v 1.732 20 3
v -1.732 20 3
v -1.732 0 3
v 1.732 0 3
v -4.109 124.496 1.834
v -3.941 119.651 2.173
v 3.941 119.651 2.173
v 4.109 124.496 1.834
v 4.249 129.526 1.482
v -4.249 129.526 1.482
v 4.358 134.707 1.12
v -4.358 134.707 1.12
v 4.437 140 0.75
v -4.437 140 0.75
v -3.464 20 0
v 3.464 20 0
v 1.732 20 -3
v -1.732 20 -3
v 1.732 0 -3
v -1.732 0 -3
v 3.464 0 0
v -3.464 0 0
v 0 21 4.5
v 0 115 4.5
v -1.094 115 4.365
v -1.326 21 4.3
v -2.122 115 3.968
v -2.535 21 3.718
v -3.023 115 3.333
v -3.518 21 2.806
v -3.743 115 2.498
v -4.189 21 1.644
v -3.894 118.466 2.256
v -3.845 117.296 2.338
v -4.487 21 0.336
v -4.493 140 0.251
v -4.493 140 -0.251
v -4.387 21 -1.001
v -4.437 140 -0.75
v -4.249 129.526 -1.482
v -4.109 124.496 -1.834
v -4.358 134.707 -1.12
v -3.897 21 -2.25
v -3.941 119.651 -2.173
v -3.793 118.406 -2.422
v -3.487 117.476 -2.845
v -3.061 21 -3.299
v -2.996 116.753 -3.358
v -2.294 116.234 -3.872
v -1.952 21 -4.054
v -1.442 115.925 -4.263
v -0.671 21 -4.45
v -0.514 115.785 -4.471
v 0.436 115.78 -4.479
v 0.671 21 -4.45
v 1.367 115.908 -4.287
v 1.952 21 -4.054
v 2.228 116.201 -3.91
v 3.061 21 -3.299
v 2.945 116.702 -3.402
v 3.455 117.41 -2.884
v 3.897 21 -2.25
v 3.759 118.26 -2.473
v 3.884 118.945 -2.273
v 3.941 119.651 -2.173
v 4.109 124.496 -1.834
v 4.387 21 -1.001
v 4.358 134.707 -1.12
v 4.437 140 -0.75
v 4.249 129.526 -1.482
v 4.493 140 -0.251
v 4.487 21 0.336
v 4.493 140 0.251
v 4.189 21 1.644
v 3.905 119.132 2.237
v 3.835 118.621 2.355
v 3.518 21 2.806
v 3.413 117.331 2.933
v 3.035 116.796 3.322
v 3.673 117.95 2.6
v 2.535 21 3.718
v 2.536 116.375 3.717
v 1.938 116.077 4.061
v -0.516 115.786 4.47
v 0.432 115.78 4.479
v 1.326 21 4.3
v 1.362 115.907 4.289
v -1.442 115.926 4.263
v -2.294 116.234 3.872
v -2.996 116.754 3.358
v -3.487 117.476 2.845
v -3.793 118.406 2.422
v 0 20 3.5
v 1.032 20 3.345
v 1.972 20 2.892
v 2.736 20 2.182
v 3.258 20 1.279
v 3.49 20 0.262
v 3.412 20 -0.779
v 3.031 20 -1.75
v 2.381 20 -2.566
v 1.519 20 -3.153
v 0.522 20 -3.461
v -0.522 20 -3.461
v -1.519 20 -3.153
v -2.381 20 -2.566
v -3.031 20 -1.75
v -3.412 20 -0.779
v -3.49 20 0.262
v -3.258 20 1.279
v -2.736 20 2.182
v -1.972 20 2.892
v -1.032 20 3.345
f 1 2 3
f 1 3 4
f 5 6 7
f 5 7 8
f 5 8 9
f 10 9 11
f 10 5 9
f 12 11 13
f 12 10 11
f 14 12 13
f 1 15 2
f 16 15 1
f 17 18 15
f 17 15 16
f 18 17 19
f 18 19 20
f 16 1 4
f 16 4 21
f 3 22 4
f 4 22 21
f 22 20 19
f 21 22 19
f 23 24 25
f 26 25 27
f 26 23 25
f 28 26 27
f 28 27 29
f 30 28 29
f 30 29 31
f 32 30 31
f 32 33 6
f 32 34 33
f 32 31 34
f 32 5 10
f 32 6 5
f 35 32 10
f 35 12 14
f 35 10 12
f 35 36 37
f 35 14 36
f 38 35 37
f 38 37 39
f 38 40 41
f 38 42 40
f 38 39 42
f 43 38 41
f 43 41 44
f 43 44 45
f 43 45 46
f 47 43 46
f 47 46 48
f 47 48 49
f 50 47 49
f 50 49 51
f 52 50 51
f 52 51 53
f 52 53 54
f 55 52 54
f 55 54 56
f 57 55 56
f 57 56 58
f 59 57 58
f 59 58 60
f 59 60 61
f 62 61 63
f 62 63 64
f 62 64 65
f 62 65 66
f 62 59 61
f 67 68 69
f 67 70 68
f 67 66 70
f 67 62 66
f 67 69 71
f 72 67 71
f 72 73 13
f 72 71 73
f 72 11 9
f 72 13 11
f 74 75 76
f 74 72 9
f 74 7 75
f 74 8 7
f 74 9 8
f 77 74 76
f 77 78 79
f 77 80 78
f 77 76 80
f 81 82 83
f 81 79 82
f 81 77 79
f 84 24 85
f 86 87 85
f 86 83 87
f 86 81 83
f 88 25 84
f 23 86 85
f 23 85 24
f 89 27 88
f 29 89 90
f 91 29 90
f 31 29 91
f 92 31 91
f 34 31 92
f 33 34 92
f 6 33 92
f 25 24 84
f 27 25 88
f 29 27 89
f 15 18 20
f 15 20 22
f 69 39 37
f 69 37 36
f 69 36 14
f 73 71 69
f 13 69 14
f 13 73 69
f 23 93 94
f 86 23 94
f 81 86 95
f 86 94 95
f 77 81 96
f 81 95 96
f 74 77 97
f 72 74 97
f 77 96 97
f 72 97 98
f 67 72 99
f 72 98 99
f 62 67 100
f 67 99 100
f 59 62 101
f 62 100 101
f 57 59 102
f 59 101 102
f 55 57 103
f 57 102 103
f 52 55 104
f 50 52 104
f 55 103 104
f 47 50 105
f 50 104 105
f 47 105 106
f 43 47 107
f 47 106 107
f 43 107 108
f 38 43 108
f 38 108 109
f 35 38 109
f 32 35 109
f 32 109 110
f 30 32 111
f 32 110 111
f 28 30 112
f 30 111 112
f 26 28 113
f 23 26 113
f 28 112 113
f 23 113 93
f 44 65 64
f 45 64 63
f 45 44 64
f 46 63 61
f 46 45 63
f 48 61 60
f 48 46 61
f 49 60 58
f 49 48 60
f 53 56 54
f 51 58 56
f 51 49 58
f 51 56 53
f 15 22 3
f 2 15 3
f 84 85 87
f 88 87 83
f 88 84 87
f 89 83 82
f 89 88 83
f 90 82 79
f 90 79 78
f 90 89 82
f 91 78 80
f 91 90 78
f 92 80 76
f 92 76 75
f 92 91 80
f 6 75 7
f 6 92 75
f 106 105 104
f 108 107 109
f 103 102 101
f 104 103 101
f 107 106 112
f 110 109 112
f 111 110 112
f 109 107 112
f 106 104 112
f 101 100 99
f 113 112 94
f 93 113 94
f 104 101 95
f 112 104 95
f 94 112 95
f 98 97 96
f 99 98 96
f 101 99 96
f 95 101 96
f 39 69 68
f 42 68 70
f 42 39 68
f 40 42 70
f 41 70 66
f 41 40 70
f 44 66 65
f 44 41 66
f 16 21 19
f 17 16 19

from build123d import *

# Parameters (mm, degrees)
BOSS_EXTRUDE1_DEPTH = 20
SKETCH3_R           = 4.5
BOSS_EXTRUDE3_DEPTH = 120
CHAMFER2_SIZE       = 1
CUT_EXTRUDE2_START  = -4.437059837
CUT_EXTRUDE2_DEPTH  = 8.874119674
FILLET2_R           = 5


# Read off the part's stored shape, not the designer's step: Cut-Extrude2
with BuildPart() as part:
    # Sketch2 → Boss-Extrude1 (new body)
    with BuildSketch(Plane(origin=(0, 0, 0), x_dir=(1, 0, 0), z_dir=(0, 1, 0))):
        Polygon((3.464101615, 0), (1.732050808, 3), (-1.732050808, 3), (-3.464101615, 0), (-1.732050808, -3), (1.732050808, -3), align=None)
    extrude(amount=BOSS_EXTRUDE1_DEPTH)


with BuildPart() as body_2:
    # Sketch3 → Boss-Extrude3 (new body)
    with BuildSketch(Plane(origin=(0, 20, 0), x_dir=(1, 0, 0), z_dir=(0, 1, 0))):
        with Locations(Location((0, 0, 0), (0, 0, 270))):
            Circle(SKETCH3_R)
    extrude(amount=BOSS_EXTRUDE3_DEPTH)

    # Chamfer2
    chamfer2_edges = [body_2.edges().sort_by_distance(p)[0] for p in [
        (0, 20, -4.5),
    ]]
    chamfer(chamfer2_edges, length=CHAMFER2_SIZE)

    # Cut-Extrude2 outline → Cut-Extrude2 (cut)
    with BuildSketch(Plane.YZ.offset(CUT_EXTRUDE2_START)):
        Polygon((115, 6), (115, 2.498170299), (140, 0.75), (140, 6), align=None)
        Polygon((140, -6), (140, -0.75), (115, -2.498170299), (115, -6), align=None)
    extrude(amount=CUT_EXTRUDE2_DEPTH, mode=Mode.SUBTRACT)

    # Fillet2
    # the kernel refuses this fillet: 5 mm, written as the material it adds along each edge
    with BuildSketch(Plane(origin=(-15.399317837, 115, -2.498170299), x_dir=(0, 0.9975640502586796, 0.0697564737604944), z_dir=(1, 0, 0))) as fillet2_piece_1_section:
        with BuildLine():
            CenterArc((FILLET2_R * 0.932515086122, -FILLET2_R), FILLET2_R, 90, 85.999999999)
            Line((-FILLET2_R * 0.0650489641364, -FILLET2_R * 0.93024352624), (0, 0))
            Line((0, 0), (FILLET2_R * 0.932515086122, 0))
        make_face()
    fillet2_piece_1 = extrude(amount=30.798635674, mode=Mode.PRIVATE)
    fillet2_piece_1 = fillet2_piece_1 & Plane(origin=(0, 116.359542547, 0), x_dir=(0, 0, 1), z_dir=(0, -1, 0)) * Cylinder(4.5, 81, mode=Mode.PRIVATE)
    add(fillet2_piece_1)
    with BuildSketch(Plane(origin=(-15.399317837, 115, 2.498170299), x_dir=(0, 0, 1), z_dir=(1, 0, 0))) as fillet2_piece_2_section:
        with BuildLine():
            CenterArc((FILLET2_R * 0.932515086122, -FILLET2_R), FILLET2_R, 90, 85.999999999)
            Line((-FILLET2_R * 0.0650489641364, -FILLET2_R * 0.93024352624), (0, 0))
            Line((0, 0), (FILLET2_R * 0.932515086122, 0))
        make_face()
    fillet2_piece_2 = extrude(amount=30.798635674, mode=Mode.PRIVATE)
    fillet2_piece_2 = fillet2_piece_2 & Plane(origin=(0, 116.359541243, 0), x_dir=(0, 0, 1), z_dir=(0, -1, 0)) * Cylinder(4.5, 81, mode=Mode.PRIVATE)
    add(fillet2_piece_2)


solid = Compound([part.part, body_2.part])
